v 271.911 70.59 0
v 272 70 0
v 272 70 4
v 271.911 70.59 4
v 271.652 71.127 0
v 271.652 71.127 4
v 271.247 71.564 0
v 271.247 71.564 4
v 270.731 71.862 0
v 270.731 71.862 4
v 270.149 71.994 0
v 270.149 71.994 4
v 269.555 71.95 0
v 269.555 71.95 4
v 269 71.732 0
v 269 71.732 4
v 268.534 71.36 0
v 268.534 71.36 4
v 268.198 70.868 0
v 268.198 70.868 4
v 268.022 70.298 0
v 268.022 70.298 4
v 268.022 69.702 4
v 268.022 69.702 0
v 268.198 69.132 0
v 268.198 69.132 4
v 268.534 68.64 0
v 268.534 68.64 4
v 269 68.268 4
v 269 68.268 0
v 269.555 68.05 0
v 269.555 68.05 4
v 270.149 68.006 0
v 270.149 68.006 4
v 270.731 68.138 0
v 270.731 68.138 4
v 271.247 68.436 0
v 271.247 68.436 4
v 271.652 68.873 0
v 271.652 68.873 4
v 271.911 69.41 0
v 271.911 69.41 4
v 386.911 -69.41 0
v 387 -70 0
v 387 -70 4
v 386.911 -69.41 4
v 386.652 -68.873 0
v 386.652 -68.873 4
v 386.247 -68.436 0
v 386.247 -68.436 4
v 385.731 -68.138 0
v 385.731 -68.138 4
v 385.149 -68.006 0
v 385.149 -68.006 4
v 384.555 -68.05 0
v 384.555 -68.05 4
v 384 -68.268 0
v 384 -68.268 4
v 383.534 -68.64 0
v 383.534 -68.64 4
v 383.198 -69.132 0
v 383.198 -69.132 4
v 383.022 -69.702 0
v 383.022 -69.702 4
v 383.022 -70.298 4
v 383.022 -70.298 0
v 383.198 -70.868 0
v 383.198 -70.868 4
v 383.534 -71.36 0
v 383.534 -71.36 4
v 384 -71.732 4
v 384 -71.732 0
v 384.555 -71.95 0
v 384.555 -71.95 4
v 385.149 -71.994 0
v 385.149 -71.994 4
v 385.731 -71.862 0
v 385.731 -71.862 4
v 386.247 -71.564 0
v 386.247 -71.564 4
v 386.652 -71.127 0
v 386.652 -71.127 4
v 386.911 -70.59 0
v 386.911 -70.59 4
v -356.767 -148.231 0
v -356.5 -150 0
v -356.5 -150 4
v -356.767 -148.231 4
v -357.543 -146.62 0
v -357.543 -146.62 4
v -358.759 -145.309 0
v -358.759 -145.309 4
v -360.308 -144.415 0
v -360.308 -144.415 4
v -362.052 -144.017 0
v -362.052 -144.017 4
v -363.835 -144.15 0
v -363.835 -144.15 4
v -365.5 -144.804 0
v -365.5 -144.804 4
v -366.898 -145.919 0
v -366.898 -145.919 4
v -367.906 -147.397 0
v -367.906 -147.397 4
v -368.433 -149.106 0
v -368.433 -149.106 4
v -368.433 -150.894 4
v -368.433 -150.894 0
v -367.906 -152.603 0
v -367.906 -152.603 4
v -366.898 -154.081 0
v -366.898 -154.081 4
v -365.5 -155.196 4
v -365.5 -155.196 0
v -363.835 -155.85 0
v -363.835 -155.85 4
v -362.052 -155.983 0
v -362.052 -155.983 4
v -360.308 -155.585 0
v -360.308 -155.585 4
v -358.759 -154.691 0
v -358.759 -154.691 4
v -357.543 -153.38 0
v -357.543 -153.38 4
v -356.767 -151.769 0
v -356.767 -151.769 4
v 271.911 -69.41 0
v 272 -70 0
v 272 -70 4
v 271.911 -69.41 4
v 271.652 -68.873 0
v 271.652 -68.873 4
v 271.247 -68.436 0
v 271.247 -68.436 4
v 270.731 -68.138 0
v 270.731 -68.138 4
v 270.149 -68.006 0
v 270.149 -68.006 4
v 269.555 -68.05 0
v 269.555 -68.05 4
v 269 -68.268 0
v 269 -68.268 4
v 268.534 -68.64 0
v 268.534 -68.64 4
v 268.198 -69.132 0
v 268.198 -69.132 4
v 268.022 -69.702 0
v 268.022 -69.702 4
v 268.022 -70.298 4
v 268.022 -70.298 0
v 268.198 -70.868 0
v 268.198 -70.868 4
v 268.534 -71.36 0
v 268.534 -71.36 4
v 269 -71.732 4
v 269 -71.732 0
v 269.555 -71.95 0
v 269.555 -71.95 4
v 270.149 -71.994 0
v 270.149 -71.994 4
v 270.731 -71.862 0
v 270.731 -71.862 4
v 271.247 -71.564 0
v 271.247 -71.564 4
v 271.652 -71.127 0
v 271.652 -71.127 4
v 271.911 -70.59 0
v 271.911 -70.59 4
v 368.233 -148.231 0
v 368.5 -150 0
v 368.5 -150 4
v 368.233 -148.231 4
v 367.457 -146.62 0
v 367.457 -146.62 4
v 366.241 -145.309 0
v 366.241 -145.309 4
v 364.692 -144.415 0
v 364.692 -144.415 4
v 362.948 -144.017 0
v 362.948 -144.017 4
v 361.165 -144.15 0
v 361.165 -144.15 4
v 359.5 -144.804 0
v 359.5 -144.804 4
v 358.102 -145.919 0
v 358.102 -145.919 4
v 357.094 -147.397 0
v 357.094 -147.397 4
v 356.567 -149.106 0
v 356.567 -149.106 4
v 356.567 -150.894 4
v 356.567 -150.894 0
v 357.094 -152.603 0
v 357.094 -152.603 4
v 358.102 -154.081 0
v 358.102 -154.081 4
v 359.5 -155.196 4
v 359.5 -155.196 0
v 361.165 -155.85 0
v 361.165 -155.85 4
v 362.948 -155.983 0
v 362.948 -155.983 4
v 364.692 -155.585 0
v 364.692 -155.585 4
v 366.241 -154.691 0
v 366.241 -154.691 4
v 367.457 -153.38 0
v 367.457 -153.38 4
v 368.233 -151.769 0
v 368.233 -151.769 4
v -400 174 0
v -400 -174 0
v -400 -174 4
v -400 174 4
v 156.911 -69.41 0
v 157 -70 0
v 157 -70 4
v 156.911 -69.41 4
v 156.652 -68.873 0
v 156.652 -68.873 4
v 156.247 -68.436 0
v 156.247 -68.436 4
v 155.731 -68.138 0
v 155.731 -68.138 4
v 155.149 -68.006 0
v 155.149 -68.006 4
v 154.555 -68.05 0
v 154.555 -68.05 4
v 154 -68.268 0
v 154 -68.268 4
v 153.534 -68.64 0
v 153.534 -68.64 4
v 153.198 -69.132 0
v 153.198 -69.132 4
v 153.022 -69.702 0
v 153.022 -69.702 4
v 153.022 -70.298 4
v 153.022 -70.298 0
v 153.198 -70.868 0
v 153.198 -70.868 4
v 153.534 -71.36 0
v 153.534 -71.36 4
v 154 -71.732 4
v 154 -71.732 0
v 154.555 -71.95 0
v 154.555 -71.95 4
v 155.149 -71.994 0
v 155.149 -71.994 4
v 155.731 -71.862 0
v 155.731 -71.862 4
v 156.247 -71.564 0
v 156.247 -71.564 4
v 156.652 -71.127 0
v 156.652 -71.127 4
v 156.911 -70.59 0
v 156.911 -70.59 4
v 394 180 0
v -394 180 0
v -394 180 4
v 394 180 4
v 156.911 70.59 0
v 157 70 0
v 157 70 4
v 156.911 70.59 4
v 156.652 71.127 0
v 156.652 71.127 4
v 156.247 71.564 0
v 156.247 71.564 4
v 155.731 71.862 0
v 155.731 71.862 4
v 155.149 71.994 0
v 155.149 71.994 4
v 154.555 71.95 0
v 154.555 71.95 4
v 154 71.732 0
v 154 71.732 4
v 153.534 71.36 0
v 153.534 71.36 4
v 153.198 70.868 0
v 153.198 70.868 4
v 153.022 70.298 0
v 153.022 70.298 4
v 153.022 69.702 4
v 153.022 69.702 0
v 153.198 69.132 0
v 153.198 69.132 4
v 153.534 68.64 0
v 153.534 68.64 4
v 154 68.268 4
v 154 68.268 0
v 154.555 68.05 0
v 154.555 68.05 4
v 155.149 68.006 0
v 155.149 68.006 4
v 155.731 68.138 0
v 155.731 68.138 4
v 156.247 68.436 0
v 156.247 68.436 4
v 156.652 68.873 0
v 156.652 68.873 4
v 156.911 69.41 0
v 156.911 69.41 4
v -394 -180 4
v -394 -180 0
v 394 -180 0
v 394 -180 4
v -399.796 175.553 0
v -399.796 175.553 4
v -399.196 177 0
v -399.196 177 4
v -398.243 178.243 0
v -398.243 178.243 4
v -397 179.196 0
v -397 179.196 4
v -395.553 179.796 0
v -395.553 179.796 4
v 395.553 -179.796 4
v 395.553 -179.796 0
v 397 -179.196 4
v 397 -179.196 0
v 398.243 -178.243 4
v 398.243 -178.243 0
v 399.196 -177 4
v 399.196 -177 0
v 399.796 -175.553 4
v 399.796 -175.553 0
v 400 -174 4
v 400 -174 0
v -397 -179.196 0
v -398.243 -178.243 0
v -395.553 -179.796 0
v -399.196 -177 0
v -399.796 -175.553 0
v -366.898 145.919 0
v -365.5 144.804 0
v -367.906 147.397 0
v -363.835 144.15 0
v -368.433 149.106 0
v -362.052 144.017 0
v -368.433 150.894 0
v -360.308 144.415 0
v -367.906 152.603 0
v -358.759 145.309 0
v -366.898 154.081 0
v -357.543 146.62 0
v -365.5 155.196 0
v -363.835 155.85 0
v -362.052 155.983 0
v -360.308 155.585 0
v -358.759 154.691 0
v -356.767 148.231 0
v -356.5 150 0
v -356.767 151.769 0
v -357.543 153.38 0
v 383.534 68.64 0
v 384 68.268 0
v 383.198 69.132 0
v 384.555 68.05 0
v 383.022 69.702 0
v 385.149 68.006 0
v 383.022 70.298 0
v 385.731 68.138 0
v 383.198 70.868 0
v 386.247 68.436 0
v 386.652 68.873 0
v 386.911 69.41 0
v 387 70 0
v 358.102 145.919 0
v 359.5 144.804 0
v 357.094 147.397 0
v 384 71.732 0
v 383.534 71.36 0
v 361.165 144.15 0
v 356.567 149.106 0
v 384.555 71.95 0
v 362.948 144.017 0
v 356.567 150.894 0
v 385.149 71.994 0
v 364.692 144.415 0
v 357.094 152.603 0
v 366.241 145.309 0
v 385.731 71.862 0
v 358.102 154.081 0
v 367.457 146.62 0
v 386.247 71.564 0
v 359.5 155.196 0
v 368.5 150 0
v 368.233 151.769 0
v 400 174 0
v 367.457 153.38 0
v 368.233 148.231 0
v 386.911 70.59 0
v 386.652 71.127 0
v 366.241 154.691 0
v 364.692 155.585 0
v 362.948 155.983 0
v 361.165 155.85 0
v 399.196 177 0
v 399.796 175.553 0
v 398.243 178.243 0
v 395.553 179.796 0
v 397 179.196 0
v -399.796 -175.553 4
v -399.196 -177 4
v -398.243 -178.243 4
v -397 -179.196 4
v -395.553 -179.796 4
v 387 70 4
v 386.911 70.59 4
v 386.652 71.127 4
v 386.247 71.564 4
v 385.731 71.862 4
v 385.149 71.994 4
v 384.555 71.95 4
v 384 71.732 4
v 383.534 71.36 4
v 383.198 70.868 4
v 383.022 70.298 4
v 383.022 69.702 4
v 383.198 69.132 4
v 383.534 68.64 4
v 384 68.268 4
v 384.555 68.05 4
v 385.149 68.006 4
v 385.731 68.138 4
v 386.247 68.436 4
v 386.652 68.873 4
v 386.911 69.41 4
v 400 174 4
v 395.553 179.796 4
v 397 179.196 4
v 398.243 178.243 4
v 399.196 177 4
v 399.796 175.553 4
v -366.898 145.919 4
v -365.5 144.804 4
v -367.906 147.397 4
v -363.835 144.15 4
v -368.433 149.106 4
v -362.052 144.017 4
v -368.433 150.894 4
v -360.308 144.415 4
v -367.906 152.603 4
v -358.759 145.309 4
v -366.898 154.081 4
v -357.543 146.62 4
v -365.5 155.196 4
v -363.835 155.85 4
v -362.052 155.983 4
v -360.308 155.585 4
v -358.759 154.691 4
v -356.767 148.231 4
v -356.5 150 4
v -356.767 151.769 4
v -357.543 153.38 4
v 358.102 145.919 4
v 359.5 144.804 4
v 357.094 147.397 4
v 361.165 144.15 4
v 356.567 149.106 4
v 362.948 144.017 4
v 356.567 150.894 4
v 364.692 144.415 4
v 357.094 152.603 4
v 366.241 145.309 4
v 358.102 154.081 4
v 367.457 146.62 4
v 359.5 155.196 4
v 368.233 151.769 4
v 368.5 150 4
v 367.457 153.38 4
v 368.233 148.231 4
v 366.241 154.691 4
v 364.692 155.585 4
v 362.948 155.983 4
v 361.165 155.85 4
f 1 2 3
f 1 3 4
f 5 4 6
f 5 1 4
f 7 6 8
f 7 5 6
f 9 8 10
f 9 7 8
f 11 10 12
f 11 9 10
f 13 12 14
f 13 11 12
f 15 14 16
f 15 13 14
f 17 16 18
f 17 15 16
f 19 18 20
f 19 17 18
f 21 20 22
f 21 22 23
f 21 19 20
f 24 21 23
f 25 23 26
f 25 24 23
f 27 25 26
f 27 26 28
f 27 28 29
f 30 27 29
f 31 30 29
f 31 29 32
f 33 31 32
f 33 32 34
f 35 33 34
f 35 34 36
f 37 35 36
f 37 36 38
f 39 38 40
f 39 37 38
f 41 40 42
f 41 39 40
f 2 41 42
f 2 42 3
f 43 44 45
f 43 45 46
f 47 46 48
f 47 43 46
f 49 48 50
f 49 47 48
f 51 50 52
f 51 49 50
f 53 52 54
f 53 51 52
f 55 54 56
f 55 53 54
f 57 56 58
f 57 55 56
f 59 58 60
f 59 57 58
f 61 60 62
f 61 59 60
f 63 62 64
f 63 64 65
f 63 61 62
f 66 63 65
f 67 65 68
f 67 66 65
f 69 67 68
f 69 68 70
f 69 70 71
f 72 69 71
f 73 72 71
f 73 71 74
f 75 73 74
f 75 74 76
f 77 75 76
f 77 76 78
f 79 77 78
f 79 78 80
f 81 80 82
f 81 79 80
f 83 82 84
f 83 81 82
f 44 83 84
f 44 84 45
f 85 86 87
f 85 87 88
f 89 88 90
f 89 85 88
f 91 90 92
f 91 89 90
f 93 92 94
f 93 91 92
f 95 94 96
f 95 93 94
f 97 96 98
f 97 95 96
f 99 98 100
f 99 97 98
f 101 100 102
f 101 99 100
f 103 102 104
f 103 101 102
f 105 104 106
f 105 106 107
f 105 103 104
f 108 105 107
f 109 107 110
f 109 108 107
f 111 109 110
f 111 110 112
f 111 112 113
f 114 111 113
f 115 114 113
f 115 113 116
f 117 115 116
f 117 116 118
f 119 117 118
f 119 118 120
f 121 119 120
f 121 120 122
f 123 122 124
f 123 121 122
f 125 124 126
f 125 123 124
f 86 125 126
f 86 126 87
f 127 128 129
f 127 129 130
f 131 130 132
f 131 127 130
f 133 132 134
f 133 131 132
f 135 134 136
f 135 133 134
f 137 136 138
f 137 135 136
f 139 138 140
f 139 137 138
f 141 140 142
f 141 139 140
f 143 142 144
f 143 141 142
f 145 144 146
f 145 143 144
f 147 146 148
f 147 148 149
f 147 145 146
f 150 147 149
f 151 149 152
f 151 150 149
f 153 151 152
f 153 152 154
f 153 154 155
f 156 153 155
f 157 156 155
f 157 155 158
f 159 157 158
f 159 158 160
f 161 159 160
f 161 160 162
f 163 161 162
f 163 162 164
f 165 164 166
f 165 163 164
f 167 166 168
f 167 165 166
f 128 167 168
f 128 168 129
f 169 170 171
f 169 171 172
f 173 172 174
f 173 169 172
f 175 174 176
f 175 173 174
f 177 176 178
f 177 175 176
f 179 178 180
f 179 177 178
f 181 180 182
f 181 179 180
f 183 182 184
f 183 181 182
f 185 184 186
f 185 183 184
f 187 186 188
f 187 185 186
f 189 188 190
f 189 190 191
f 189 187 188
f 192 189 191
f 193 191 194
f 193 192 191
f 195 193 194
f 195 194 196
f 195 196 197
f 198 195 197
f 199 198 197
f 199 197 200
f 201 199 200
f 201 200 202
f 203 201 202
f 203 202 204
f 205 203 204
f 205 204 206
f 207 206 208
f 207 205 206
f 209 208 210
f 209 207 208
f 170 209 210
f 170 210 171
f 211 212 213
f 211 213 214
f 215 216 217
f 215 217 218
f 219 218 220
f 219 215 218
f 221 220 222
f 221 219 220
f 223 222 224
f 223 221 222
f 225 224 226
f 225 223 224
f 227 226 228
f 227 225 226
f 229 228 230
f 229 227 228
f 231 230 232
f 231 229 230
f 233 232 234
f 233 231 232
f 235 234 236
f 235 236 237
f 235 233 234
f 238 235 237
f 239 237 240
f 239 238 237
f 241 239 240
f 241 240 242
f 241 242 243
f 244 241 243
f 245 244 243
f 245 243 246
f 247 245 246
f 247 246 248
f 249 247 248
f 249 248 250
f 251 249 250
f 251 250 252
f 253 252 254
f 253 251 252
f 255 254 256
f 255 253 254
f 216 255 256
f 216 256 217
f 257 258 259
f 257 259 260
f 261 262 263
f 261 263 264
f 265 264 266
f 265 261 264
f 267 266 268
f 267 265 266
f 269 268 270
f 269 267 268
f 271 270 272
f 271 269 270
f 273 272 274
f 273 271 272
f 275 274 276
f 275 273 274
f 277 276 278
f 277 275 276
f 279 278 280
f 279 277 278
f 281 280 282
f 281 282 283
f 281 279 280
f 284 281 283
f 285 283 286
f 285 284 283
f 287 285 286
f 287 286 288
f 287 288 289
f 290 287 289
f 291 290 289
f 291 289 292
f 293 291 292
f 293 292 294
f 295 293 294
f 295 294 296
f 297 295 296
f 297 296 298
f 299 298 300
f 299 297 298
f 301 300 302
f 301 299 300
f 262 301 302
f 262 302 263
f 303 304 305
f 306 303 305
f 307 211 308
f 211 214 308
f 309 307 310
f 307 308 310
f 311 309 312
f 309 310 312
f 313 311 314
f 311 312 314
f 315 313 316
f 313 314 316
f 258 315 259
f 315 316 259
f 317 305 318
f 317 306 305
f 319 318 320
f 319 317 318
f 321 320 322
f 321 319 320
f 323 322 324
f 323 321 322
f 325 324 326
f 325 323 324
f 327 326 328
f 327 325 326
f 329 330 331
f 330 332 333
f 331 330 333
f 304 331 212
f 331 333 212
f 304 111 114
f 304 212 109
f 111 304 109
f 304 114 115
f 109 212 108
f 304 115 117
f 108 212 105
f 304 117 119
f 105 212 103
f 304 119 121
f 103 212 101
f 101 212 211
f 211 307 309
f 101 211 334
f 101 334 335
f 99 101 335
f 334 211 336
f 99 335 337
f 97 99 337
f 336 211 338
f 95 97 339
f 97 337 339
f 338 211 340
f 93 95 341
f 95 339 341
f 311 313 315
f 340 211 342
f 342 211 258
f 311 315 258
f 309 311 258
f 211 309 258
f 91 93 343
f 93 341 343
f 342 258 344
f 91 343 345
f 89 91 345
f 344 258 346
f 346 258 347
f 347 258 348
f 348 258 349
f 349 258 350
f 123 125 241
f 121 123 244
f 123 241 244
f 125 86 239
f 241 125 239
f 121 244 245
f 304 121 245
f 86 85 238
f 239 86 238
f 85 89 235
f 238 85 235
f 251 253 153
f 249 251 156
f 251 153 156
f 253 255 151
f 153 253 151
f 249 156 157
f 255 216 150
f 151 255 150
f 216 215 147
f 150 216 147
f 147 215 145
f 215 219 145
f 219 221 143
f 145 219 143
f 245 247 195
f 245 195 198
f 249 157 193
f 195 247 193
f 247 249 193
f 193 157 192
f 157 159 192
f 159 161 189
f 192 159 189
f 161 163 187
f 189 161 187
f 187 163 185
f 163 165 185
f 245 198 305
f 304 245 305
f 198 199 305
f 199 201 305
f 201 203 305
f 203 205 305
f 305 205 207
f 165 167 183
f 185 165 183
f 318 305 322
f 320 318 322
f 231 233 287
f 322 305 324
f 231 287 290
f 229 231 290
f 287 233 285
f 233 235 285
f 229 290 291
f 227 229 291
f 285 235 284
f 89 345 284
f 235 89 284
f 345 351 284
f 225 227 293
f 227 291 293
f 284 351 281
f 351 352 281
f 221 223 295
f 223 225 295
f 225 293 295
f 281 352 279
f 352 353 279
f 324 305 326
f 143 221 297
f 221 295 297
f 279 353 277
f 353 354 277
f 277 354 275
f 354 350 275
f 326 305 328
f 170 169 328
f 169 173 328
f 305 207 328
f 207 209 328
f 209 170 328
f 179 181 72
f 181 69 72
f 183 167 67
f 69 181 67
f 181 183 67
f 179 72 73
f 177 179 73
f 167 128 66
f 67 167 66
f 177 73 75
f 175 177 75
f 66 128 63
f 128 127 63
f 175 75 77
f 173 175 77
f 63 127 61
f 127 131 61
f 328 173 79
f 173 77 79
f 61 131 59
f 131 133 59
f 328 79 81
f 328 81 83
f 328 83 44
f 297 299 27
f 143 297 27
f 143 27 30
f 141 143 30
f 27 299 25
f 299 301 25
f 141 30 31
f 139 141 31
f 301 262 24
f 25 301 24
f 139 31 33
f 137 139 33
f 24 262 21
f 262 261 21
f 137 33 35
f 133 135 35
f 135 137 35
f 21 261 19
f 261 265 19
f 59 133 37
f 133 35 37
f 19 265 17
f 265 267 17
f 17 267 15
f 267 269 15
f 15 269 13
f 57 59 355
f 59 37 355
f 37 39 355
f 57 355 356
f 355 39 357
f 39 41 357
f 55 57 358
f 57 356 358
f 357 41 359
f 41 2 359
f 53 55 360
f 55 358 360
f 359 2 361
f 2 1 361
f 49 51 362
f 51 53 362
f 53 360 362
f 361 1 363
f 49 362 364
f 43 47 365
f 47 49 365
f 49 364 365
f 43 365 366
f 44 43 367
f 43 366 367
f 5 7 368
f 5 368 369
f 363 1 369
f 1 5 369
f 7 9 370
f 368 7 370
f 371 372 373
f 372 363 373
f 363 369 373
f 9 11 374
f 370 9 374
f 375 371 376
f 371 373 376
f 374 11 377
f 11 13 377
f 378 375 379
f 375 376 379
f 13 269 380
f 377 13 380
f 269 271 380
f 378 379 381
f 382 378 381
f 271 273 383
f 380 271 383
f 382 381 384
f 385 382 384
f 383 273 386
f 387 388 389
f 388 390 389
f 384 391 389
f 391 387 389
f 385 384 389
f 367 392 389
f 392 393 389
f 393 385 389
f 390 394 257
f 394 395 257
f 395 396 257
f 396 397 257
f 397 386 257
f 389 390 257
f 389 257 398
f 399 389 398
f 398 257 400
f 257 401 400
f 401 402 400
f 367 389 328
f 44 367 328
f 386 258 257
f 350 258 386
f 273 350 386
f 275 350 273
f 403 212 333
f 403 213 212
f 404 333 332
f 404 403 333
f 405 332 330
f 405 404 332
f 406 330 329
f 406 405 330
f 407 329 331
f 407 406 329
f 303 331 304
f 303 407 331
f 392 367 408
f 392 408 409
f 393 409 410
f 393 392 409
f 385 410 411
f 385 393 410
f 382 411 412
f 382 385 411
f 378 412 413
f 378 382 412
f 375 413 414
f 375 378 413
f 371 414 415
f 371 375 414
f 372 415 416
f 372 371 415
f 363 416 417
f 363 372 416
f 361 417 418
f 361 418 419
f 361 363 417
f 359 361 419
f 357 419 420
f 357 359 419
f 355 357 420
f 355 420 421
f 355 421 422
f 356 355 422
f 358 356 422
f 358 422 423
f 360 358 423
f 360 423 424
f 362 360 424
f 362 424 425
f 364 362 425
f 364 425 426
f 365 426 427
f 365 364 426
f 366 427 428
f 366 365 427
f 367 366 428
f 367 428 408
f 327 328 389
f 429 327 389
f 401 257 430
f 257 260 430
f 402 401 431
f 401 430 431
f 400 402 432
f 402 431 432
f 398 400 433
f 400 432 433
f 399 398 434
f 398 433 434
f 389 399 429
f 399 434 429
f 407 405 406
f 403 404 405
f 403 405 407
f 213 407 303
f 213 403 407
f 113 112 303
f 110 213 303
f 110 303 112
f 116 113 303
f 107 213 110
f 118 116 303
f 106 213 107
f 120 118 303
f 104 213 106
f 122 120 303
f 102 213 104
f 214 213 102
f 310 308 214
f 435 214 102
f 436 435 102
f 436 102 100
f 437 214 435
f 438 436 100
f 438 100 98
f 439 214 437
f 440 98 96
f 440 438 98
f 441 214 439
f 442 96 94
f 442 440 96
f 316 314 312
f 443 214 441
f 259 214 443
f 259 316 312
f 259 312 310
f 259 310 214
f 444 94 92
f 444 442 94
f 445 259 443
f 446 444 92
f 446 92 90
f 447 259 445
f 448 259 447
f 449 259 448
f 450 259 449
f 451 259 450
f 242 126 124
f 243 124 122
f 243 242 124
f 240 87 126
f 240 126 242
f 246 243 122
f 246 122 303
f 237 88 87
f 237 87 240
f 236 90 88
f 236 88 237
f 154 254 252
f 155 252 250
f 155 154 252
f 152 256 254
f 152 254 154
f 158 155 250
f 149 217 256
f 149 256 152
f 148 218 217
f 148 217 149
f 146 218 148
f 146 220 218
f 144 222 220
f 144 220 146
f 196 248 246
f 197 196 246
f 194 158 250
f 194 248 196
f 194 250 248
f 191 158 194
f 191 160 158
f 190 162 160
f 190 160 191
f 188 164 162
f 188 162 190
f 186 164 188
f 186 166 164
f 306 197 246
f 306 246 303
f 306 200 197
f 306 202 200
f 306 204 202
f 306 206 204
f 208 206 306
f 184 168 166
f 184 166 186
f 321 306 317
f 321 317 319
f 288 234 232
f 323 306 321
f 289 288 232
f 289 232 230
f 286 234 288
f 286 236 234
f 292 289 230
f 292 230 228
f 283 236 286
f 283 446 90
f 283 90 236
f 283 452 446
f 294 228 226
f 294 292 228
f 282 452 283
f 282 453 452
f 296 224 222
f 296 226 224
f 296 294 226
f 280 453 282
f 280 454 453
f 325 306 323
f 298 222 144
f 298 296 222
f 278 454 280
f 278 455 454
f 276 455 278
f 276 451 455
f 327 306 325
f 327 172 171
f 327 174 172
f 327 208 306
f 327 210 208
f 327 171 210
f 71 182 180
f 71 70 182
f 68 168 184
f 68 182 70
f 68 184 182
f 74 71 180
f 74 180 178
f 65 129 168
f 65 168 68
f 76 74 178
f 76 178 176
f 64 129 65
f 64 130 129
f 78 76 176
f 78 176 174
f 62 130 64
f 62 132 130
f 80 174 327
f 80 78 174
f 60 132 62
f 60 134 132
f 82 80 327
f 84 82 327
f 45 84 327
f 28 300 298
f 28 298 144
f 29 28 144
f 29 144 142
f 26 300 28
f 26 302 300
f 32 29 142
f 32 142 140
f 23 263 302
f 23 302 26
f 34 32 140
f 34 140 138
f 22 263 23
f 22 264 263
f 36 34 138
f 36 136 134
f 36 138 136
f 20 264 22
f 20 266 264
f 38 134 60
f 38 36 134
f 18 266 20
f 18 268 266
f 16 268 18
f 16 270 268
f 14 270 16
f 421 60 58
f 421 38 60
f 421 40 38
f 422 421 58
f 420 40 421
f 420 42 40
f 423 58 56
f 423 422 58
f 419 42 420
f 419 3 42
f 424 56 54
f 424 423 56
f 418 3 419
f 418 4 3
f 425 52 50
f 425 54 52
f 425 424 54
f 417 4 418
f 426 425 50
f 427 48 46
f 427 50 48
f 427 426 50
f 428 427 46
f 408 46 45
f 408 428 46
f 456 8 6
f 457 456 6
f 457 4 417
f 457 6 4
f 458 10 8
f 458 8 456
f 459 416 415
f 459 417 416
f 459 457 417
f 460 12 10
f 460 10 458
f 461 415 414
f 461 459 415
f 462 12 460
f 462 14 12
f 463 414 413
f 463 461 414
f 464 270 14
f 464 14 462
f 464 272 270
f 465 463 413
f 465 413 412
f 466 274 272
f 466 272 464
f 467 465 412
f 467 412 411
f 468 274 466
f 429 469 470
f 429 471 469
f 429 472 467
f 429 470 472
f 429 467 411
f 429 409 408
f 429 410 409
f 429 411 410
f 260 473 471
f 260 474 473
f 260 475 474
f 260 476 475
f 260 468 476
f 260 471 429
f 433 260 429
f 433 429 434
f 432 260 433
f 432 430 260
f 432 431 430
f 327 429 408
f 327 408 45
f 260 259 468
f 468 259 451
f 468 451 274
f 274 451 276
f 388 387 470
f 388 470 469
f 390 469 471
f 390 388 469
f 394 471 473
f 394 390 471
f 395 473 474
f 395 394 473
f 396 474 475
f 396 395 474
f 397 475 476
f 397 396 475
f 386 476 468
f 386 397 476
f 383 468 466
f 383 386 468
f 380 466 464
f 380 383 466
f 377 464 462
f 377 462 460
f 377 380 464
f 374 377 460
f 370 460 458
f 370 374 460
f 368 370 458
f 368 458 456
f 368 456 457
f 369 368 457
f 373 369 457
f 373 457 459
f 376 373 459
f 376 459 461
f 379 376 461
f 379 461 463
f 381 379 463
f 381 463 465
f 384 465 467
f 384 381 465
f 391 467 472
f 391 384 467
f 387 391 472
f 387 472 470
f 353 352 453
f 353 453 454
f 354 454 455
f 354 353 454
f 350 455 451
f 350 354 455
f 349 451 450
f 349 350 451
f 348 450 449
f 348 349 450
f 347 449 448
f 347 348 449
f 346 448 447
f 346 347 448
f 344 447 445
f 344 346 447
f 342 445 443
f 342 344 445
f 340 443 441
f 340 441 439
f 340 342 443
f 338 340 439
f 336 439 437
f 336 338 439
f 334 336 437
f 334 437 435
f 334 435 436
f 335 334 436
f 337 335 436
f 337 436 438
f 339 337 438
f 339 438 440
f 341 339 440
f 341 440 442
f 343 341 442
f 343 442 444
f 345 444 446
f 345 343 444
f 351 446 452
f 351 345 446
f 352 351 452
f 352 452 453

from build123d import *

# Parameters (mm, degrees)
SKETCH_1_W      = 800
SKETCH_1_H      = 360
SKETCH_1_R      = 6
SKETCH_1_R_2    = 2
EXTRUDE_1_DEPTH = 4
FILLET_1_R      = 6


with BuildPart() as part:
    # 草图1 → 凸台-拉伸1 (new body)
    with BuildSketch(Plane.XY):
        Rectangle(SKETCH_1_W, SKETCH_1_H)
        with Locations((-362.5, 150)):
            Circle(SKETCH_1_R, mode=Mode.SUBTRACT)
        with Locations((-362.5, -150)):
            Circle(SKETCH_1_R, mode=Mode.SUBTRACT)
        with Locations((362.5, -150)):
            Circle(SKETCH_1_R, mode=Mode.SUBTRACT)
        with Locations((362.5, 150)):
            Circle(SKETCH_1_R, mode=Mode.SUBTRACT)
        with Locations((155, 70)):
            Circle(SKETCH_1_R_2, mode=Mode.SUBTRACT)
        with Locations((270, 70)):
            Circle(SKETCH_1_R_2, mode=Mode.SUBTRACT)
        with Locations((385, 70)):
            Circle(SKETCH_1_R_2, mode=Mode.SUBTRACT)
        with Locations((385, -70)):
            Circle(SKETCH_1_R_2, mode=Mode.SUBTRACT)
        with Locations((270, -70)):
            Circle(SKETCH_1_R_2, mode=Mode.SUBTRACT)
        with Locations((155, -70)):
            Circle(SKETCH_1_R_2, mode=Mode.SUBTRACT)
    extrude(amount=EXTRUDE_1_DEPTH)

    # 圆角1
    fillet_1_edges = [part.edges().sort_by_distance(p)[0] for p in [
        (400, -180, 2),
        (-400, -180, 2),
        (-400, 180, 2),
        (400, 180, 2),
    ]]
    fillet(fillet_1_edges, radius=FILLET_1_R)


solid = part.part
